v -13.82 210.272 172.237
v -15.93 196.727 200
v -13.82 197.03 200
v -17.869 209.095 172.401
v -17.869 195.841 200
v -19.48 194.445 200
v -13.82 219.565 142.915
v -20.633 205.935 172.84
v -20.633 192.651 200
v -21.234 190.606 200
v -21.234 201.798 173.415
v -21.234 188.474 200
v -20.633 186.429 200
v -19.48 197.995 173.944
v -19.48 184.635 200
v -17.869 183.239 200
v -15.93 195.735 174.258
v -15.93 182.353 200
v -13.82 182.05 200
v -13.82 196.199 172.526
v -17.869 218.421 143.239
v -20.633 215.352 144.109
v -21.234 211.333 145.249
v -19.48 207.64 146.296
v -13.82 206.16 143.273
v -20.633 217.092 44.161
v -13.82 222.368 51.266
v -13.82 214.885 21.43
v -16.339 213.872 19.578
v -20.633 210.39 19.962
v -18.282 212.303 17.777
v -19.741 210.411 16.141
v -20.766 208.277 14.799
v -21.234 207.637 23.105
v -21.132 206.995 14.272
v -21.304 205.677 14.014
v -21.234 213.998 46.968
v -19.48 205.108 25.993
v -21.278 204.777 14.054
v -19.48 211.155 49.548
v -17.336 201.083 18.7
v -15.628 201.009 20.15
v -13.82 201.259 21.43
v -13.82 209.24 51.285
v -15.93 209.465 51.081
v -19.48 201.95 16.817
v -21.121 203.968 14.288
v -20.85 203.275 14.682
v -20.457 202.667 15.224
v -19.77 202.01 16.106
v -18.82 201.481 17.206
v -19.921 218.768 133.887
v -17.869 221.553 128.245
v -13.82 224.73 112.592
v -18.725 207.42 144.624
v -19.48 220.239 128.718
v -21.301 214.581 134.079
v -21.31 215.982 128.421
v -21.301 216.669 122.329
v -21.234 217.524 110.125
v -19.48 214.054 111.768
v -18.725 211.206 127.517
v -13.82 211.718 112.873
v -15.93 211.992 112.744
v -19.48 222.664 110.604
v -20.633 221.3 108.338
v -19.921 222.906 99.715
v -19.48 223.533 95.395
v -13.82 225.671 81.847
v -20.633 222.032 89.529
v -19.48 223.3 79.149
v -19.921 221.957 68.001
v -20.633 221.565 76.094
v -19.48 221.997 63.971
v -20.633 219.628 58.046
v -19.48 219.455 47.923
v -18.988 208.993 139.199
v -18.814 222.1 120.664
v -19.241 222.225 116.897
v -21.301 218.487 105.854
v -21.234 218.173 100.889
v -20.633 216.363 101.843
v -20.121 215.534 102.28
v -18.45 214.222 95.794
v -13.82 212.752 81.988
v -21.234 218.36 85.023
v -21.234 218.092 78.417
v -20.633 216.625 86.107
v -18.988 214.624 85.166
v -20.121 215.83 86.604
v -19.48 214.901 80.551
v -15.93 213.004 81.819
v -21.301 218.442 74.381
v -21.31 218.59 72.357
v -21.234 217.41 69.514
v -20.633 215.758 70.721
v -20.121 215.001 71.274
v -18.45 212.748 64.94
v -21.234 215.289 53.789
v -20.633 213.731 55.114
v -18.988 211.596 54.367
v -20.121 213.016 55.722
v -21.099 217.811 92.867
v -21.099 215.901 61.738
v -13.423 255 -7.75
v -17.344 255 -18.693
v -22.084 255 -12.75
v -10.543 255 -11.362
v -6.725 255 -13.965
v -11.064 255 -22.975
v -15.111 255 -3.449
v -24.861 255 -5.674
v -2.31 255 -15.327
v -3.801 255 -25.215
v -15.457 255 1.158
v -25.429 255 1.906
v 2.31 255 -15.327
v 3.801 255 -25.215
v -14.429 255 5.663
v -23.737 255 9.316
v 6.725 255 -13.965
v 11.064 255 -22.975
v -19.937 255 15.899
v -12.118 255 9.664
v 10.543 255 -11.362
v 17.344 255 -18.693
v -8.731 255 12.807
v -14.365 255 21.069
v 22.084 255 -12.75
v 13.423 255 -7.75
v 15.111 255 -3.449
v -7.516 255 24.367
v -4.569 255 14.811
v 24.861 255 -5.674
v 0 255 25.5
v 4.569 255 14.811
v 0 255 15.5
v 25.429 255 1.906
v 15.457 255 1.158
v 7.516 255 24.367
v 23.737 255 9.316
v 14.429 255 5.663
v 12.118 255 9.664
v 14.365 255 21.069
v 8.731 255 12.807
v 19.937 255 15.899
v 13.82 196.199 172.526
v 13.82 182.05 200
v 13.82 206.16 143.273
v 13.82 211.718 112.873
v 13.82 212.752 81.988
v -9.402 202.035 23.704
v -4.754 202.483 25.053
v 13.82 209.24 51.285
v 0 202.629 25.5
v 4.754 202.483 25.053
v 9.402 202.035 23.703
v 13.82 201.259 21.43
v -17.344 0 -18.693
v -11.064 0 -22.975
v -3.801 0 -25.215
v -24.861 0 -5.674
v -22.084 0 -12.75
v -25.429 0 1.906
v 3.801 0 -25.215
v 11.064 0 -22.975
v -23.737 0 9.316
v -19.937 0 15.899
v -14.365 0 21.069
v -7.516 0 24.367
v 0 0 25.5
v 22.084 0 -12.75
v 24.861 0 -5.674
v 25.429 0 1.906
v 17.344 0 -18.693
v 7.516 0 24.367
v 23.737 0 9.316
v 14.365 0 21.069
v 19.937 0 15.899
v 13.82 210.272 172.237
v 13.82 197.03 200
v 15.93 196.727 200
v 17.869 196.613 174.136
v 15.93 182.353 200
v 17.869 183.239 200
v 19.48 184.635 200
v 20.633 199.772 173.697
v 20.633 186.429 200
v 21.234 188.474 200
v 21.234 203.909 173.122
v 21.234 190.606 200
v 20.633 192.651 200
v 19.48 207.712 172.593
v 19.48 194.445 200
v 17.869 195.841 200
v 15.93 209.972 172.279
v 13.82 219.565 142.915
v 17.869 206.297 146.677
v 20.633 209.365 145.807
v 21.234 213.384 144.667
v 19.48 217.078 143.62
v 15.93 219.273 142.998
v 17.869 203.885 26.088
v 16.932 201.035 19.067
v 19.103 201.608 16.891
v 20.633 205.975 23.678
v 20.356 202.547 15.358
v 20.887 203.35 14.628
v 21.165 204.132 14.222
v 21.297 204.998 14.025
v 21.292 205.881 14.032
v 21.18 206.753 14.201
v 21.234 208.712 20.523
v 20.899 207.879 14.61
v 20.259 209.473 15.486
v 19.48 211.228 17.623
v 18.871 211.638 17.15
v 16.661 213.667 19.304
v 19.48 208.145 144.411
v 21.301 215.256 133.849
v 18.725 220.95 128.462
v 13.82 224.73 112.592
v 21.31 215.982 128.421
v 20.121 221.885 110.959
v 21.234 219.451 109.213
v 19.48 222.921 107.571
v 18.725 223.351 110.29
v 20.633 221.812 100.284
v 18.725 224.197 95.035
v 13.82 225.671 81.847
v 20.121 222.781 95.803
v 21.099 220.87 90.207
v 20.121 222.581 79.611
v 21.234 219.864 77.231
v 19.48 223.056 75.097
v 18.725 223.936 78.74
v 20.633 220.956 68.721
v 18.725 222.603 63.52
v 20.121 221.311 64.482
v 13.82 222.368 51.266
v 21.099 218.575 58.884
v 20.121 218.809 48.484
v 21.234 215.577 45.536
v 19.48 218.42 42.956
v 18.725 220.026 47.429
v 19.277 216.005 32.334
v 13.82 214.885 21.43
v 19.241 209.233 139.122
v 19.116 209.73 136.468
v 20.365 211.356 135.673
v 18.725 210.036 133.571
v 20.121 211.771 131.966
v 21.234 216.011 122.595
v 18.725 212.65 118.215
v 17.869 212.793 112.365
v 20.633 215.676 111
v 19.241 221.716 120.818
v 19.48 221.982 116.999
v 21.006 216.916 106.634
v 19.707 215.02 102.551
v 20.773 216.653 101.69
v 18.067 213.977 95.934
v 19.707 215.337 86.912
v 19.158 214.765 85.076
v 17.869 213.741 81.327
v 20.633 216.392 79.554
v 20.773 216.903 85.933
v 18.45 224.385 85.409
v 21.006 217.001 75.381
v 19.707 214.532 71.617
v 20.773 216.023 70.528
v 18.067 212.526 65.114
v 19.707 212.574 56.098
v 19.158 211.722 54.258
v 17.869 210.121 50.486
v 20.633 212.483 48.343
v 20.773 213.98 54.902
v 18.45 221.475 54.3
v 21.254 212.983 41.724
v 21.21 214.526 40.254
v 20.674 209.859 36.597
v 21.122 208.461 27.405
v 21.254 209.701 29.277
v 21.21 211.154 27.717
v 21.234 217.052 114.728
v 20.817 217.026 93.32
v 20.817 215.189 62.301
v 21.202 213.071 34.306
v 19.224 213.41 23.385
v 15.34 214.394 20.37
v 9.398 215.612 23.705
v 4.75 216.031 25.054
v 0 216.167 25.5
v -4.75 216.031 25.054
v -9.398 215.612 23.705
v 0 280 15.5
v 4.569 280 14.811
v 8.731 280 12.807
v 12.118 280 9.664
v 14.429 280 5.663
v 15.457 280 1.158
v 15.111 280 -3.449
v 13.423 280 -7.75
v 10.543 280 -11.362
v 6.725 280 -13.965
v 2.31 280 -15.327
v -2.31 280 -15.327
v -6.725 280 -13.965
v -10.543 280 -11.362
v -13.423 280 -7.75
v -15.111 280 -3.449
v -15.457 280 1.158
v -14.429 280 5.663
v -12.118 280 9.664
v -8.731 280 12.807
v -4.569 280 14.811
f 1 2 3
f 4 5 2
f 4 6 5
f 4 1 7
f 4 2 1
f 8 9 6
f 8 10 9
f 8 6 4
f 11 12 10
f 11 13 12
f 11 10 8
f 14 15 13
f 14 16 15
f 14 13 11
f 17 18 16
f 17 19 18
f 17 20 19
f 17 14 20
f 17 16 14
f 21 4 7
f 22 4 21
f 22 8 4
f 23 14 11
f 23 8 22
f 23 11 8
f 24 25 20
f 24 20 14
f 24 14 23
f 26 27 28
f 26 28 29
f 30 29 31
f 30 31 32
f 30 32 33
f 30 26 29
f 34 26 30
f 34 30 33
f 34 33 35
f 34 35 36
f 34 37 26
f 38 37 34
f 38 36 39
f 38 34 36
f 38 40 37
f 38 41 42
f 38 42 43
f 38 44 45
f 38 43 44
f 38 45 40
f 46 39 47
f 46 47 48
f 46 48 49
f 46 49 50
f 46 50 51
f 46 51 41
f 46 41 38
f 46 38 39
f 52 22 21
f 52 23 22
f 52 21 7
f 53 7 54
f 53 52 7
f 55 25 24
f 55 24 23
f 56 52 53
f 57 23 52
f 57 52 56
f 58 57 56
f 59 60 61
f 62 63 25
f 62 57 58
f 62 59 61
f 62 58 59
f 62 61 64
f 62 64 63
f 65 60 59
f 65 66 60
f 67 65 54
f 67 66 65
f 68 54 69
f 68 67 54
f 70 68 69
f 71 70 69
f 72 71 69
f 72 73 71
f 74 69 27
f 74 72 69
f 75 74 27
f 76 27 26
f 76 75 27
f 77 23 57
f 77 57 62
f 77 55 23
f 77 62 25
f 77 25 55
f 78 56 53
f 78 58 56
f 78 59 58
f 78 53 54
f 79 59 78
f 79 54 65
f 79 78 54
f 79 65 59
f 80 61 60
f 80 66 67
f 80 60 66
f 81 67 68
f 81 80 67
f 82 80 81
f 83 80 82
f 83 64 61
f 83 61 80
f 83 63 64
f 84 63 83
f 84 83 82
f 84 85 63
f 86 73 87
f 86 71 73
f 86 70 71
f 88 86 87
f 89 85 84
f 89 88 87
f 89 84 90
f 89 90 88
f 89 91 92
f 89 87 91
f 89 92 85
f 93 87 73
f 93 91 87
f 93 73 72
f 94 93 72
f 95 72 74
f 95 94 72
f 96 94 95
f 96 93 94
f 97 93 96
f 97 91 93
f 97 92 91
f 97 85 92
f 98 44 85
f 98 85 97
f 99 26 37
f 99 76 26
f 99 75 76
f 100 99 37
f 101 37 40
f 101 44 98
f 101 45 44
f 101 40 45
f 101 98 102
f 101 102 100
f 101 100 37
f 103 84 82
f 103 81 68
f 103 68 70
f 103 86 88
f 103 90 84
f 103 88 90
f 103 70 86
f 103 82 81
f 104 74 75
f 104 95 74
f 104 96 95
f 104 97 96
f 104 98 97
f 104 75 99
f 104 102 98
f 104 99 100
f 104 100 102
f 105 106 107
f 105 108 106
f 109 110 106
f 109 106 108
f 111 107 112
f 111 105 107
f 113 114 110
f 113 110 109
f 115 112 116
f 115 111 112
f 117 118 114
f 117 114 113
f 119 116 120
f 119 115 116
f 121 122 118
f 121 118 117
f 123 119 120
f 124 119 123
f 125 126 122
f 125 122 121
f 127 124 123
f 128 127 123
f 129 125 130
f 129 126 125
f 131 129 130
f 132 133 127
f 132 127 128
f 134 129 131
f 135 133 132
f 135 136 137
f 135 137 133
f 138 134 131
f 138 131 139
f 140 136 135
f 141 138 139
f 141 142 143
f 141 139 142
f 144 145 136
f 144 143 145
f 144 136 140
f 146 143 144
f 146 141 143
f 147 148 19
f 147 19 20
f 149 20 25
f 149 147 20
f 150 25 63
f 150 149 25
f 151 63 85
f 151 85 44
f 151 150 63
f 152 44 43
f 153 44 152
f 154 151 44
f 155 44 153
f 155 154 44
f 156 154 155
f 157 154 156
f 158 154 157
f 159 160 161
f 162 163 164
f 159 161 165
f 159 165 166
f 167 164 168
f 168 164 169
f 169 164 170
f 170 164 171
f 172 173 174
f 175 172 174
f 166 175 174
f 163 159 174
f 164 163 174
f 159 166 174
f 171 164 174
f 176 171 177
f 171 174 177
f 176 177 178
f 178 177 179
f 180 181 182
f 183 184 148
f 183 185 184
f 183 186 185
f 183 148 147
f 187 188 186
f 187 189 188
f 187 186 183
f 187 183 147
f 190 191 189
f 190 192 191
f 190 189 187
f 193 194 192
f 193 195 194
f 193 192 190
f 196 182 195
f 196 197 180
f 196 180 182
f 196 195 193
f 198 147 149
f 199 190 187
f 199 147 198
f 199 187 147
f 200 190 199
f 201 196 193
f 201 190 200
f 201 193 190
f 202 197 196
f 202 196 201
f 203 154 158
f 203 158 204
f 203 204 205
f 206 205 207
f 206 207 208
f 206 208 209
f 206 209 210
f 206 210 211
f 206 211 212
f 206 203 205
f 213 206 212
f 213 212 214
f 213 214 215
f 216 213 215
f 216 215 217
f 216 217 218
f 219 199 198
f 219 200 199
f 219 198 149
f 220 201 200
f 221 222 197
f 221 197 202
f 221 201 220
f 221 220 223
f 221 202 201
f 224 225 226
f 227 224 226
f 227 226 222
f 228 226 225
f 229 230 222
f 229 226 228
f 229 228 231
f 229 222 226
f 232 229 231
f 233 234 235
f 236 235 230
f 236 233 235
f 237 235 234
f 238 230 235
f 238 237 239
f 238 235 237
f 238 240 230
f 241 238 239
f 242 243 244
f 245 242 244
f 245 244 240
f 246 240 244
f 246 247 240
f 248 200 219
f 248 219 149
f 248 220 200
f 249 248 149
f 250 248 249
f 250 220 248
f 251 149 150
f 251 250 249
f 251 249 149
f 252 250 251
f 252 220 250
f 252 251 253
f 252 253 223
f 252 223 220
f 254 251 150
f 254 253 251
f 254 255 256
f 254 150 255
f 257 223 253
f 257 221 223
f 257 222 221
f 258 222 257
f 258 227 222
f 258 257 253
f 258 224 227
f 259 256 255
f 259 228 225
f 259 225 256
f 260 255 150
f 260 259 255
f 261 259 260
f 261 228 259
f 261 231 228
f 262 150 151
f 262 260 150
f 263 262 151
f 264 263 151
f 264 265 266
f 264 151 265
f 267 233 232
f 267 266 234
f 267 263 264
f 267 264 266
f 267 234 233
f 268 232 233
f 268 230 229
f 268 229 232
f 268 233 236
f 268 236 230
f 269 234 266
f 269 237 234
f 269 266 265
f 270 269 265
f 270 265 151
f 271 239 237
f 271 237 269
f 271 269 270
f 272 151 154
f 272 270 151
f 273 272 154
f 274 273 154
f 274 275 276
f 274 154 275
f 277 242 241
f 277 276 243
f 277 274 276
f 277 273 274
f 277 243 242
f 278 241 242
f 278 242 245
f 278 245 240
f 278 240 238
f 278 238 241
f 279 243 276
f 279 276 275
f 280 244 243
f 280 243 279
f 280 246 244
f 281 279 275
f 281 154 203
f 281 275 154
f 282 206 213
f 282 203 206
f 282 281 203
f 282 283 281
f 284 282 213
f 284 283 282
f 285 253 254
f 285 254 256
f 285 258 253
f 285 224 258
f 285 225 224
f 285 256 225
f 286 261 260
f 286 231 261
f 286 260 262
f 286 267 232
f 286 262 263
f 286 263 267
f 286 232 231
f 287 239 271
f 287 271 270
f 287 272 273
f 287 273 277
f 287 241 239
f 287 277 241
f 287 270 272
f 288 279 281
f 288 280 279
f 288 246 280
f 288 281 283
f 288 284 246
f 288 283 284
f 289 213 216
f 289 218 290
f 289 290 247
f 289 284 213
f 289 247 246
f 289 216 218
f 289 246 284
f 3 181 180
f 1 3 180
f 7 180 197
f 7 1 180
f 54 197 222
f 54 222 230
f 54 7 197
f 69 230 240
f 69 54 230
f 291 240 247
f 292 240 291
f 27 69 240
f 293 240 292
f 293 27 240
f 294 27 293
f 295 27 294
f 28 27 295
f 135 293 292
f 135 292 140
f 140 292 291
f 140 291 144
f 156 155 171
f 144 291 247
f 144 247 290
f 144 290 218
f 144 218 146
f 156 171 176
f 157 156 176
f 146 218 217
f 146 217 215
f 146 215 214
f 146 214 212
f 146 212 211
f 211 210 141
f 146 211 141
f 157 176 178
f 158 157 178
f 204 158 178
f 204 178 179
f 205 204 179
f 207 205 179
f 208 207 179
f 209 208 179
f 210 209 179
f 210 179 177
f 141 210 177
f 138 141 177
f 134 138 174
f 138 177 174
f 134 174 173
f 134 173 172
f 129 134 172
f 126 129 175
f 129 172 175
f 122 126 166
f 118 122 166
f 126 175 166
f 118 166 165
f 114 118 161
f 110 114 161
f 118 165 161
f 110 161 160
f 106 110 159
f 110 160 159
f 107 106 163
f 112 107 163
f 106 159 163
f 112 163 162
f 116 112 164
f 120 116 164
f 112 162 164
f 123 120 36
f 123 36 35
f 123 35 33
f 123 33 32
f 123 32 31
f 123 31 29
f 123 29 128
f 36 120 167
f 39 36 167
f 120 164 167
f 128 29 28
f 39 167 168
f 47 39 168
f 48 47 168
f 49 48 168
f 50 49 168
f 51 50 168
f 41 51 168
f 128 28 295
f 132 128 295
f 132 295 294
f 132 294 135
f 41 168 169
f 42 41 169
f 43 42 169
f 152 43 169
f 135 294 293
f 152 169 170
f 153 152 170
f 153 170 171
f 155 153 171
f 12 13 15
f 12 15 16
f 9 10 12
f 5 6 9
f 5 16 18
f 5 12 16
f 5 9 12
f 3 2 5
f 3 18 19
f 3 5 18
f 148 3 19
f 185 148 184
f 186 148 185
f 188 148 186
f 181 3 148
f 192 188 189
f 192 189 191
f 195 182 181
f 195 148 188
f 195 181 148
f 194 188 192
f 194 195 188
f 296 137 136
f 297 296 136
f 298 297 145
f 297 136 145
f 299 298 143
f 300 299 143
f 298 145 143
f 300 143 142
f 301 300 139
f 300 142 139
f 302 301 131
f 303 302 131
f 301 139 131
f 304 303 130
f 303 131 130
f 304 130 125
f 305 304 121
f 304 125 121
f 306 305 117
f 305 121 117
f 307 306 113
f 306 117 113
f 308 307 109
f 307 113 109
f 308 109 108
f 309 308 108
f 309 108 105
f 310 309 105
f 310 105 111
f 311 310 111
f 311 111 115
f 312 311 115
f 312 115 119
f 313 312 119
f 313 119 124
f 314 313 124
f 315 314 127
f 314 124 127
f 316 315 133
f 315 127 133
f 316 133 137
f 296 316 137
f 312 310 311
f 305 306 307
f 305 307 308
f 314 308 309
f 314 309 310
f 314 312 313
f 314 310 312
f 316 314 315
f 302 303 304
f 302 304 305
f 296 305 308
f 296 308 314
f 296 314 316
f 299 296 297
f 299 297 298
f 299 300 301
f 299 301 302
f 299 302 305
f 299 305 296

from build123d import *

# Parameters (mm, degrees)
SKETCH1_R           = 25.5
BOSS_EXTRUDE1_DEPTH = 255
SKETCH5_R           = 15.5
BOSS_EXTRUDE2_DEPTH = 25


with BuildPart() as part:
    # Sketch1 → Boss-Extrude1 (new body)
    with BuildSketch(Plane(origin=(0, 0, 0), x_dir=(1, 0, 0), z_dir=(0, 1, 0))):
        with Locations(Location((0, 0, 0), (0, 0, 270))):
            Circle(SKETCH1_R)
    extrude(amount=BOSS_EXTRUDE1_DEPTH)

    # Sweep1: sweep along a path in Sketch4
    with BuildLine(Plane(origin=(0, 0, 0), x_dir=(0, 0, -1), z_dir=(1, 0, 0))) as sweep1_path:
        ThreePointArc((-200, 189.54), (-101.226787493, 219.07574986), (0, 199.54))
    # Sketch3 → Sweep1 (sweep)
    with BuildSketch(Plane.XY.offset(200)):
        with BuildLine():
            Line((-13.819688726, 197.030082188), (13.819688726, 197.030082188))
            ThreePointArc((13.819688726, 197.030082188), (21.309770914, 189.54), (13.819688726, 182.049917812))
            Line((13.819688726, 182.049917812), (-13.819688726, 182.049917812))
            ThreePointArc((-13.819688726, 182.049917812), (-21.309770914, 189.54), (-13.819688726, 197.030082188))
        make_face()
    sweep(path=sweep1_path.line)

    # Sketch5 → Boss-Extrude2 (add)
    with BuildSketch(Plane(origin=(0, 255, 0), x_dir=(1, 0, 0), z_dir=(0, 1, 0))):
        with Locations(Location((0, 0, 0), (0, 0, 270))):
            Circle(SKETCH5_R)
    extrude(amount=BOSS_EXTRUDE2_DEPTH)


solid = part.part
